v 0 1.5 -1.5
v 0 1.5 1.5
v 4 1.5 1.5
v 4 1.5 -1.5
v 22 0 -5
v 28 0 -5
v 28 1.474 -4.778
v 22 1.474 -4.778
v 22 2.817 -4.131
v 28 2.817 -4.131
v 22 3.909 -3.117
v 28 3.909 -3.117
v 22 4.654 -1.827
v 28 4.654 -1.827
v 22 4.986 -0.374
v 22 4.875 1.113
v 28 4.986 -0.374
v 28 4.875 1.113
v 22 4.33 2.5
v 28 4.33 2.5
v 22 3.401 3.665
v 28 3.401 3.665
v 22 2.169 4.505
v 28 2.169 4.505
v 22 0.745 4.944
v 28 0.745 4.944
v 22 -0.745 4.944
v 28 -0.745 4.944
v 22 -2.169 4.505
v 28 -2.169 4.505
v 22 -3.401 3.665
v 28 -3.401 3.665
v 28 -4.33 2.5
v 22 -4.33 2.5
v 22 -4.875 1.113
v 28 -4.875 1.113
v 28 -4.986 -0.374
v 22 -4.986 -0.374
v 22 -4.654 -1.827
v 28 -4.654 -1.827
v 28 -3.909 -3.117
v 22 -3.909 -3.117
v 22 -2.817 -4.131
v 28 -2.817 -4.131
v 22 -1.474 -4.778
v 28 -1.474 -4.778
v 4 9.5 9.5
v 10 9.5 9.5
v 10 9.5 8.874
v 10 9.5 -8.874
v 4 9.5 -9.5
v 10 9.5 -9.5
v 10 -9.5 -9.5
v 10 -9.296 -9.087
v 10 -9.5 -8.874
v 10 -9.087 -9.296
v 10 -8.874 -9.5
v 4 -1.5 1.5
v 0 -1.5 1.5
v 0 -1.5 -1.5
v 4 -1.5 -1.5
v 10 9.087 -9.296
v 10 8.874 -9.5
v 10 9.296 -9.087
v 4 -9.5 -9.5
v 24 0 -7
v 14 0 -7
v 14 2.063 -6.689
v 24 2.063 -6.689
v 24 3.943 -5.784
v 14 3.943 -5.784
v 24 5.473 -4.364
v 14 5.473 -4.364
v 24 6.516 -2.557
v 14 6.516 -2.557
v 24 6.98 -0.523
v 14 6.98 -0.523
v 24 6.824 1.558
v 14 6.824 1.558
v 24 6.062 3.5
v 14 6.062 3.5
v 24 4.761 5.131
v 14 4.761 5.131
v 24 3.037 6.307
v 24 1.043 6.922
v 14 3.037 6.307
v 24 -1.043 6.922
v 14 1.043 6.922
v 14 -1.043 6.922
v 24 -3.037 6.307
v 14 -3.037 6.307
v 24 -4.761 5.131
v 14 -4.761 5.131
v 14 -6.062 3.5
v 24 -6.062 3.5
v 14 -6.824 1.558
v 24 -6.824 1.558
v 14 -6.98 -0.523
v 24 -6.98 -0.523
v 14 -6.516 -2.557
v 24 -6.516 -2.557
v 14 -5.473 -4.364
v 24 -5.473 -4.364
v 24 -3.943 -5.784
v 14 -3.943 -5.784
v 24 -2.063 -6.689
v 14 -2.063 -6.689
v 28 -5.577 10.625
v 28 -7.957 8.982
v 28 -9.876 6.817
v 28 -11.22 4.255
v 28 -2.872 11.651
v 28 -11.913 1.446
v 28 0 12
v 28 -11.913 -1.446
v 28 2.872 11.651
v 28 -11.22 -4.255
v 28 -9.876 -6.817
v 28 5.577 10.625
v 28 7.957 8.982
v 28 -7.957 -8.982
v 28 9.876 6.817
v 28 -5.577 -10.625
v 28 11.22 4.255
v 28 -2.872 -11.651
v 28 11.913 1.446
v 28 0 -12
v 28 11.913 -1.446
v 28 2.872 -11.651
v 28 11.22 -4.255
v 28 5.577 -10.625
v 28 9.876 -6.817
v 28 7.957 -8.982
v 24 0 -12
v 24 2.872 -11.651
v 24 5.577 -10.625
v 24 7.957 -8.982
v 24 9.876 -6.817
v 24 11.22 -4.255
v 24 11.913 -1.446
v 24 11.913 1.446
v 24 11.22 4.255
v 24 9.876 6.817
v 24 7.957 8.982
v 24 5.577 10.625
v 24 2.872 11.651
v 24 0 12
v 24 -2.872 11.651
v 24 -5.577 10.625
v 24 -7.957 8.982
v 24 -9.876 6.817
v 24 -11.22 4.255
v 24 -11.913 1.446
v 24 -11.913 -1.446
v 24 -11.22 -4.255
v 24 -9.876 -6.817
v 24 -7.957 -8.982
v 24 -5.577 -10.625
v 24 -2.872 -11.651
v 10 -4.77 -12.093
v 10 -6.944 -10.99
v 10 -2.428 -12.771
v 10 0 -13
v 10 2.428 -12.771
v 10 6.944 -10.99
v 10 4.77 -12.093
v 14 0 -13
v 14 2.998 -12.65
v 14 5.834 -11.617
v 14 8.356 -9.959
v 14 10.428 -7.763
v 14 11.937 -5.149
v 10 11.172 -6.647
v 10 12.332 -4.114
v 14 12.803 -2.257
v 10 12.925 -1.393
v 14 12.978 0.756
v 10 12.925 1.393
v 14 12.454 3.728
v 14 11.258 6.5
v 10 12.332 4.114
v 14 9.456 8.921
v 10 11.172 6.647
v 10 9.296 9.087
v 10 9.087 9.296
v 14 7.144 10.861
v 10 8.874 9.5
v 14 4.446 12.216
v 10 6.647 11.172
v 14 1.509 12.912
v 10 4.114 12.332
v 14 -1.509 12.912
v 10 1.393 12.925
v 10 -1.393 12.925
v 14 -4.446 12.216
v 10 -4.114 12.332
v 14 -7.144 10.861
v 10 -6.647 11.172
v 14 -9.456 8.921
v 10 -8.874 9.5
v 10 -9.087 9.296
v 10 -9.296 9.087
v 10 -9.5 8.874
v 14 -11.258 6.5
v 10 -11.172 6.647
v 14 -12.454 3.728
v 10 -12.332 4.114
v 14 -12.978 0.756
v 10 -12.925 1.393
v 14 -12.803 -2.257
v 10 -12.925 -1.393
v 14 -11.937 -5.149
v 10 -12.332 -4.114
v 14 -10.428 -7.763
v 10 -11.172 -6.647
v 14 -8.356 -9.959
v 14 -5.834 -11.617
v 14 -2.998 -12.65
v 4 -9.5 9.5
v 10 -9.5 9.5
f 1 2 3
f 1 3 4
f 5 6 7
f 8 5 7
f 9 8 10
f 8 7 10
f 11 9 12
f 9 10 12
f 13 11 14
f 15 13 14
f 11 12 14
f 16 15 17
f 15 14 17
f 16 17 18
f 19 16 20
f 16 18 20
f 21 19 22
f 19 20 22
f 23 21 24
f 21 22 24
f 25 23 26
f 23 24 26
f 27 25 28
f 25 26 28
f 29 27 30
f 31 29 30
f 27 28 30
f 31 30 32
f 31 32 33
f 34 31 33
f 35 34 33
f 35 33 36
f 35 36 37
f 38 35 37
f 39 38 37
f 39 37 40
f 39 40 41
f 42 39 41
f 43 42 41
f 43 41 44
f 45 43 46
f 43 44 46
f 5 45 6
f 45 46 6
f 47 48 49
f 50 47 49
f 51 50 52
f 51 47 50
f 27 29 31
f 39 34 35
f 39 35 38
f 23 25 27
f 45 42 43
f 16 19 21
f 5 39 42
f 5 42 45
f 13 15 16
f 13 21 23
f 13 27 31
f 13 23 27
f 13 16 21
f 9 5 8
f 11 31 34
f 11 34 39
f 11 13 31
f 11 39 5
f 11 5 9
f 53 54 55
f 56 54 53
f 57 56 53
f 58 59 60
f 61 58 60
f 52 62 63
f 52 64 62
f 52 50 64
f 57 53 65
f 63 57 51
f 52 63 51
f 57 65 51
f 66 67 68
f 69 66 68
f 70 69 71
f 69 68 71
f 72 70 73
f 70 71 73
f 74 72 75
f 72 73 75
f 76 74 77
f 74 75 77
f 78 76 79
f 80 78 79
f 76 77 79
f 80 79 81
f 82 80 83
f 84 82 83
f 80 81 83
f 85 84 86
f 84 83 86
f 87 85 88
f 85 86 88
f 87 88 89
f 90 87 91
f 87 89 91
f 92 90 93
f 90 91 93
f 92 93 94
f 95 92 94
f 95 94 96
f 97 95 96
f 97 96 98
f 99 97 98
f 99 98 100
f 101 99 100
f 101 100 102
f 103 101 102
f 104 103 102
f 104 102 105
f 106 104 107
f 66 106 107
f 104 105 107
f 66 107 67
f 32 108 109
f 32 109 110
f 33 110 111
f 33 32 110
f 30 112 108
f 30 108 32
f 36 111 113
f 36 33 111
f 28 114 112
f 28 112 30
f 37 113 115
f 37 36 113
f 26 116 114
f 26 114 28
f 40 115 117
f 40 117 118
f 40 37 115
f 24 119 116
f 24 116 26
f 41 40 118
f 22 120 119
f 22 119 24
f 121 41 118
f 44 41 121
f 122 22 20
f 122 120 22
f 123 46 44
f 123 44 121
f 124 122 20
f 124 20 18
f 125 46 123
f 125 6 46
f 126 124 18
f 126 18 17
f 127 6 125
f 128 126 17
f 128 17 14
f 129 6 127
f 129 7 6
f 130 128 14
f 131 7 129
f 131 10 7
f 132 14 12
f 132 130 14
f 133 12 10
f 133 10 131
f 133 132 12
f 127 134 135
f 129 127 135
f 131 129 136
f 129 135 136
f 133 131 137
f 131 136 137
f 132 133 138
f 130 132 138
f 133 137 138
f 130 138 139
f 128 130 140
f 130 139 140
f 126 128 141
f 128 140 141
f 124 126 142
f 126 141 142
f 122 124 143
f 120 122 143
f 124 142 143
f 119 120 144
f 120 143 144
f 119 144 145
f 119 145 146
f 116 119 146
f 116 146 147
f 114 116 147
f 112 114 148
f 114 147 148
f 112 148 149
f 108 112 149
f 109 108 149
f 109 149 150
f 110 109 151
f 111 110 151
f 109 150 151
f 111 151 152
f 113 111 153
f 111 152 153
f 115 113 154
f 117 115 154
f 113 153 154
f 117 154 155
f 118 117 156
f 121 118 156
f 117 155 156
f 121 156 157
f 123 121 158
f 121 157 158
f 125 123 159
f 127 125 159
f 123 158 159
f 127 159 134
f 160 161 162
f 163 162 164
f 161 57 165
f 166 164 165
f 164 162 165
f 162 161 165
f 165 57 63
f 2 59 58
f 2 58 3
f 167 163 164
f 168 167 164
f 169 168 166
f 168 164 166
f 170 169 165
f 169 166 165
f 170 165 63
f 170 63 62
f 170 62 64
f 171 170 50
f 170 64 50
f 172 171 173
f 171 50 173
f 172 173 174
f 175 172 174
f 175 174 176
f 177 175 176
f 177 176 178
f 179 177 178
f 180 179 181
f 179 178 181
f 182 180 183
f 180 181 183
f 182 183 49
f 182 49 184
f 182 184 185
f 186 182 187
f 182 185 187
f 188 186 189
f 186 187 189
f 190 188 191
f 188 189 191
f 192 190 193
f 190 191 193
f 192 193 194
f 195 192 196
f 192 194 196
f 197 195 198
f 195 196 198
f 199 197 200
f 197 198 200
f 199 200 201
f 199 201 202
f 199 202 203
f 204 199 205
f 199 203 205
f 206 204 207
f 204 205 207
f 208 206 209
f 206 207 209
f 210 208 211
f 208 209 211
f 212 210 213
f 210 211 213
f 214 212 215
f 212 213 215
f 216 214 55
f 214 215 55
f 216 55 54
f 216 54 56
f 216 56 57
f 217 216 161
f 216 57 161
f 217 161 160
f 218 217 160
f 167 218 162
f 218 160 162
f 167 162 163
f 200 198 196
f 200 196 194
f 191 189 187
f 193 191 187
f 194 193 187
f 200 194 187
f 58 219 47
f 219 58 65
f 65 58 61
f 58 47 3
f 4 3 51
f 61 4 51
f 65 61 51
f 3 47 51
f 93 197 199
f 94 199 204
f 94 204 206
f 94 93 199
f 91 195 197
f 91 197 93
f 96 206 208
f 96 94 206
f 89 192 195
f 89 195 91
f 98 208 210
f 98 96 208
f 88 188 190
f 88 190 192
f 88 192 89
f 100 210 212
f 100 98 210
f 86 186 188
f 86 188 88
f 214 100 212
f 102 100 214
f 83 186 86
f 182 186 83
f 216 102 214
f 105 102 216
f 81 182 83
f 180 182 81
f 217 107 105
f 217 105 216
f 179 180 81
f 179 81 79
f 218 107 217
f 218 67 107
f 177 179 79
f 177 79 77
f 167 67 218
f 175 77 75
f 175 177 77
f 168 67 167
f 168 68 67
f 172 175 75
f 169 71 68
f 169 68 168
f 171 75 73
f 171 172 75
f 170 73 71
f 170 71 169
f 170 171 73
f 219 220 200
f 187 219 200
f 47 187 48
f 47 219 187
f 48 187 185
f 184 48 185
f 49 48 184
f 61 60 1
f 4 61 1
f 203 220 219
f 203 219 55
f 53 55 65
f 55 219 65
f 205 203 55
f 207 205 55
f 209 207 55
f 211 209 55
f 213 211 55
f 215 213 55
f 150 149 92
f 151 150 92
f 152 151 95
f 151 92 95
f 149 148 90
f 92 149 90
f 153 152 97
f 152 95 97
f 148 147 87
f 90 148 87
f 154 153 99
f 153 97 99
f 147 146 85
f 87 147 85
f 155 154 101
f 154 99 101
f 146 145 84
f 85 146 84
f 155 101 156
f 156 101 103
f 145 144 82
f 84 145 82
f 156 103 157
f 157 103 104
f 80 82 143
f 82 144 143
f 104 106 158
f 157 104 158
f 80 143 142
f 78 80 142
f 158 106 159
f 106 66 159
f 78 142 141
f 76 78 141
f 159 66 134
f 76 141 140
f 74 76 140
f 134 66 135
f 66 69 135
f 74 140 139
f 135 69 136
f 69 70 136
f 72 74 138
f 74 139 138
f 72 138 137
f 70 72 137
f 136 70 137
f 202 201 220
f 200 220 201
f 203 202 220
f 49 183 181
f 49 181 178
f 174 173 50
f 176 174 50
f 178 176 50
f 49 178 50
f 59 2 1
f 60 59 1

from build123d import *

# Parameters (mm, degrees)
SKETCH1_W           = 3
SKETCH1_H           = 3
BOSS_EXTRUDE1_DEPTH = 4
SKETCH2_W           = 19
SKETCH2_H           = 19
BOSS_EXTRUDE2_DEPTH = 6
SKETCH3_R           = 13
BOSS_EXTRUDE3_DEPTH = 4
SKETCH4_R           = 7
BOSS_EXTRUDE4_DEPTH = 10
SKETCH5_R           = 12
BOSS_EXTRUDE5_DEPTH = 4
SKETCH6_R           = 5
CUT_EXTRUDE1_DEPTH  = 6


with BuildPart() as part:
    # Sketch1 → Boss-Extrude1 (new body)
    with BuildSketch(Plane(origin=(0, 0, 0), x_dir=(0, 0, -1), z_dir=(1, 0, 0))):
        Rectangle(SKETCH1_W, SKETCH1_H)
    extrude(amount=BOSS_EXTRUDE1_DEPTH)

    # Sketch2 → Boss-Extrude2 (add)
    with BuildSketch(Plane(origin=(4, 0, 0), x_dir=(0, 0, -1), z_dir=(1, 0, 0))):
        Rectangle(SKETCH2_W, SKETCH2_H)
    extrude(amount=BOSS_EXTRUDE2_DEPTH)

    # Sketch3 → Boss-Extrude3 (add)
    with BuildSketch(Plane(origin=(10, 0, 0), x_dir=(0, 0, -1), z_dir=(1, 0, 0))):
        Circle(SKETCH3_R)
    extrude(amount=BOSS_EXTRUDE3_DEPTH)

    # Sketch4 → Boss-Extrude4 (add)
    with BuildSketch(Plane(origin=(14, 0, 0), x_dir=(0, 0, -1), z_dir=(1, 0, 0))):
        Circle(SKETCH4_R)
    extrude(amount=BOSS_EXTRUDE4_DEPTH)

    # Sketch5 → Boss-Extrude5 (add)
    with BuildSketch(Plane(origin=(24, 0, 0), x_dir=(0, 0, -1), z_dir=(1, 0, 0))):
        Circle(SKETCH5_R)
    extrude(amount=BOSS_EXTRUDE5_DEPTH)

    # Sketch6 → Cut-Extrude1 (cut)
    with BuildSketch(Plane(origin=(28, 0, 0), x_dir=(0, 0, -1), z_dir=(1, 0, 0))):
        Circle(SKETCH6_R)
    extrude(amount=-CUT_EXTRUDE1_DEPTH, mode=Mode.SUBTRACT)


solid = part.part
